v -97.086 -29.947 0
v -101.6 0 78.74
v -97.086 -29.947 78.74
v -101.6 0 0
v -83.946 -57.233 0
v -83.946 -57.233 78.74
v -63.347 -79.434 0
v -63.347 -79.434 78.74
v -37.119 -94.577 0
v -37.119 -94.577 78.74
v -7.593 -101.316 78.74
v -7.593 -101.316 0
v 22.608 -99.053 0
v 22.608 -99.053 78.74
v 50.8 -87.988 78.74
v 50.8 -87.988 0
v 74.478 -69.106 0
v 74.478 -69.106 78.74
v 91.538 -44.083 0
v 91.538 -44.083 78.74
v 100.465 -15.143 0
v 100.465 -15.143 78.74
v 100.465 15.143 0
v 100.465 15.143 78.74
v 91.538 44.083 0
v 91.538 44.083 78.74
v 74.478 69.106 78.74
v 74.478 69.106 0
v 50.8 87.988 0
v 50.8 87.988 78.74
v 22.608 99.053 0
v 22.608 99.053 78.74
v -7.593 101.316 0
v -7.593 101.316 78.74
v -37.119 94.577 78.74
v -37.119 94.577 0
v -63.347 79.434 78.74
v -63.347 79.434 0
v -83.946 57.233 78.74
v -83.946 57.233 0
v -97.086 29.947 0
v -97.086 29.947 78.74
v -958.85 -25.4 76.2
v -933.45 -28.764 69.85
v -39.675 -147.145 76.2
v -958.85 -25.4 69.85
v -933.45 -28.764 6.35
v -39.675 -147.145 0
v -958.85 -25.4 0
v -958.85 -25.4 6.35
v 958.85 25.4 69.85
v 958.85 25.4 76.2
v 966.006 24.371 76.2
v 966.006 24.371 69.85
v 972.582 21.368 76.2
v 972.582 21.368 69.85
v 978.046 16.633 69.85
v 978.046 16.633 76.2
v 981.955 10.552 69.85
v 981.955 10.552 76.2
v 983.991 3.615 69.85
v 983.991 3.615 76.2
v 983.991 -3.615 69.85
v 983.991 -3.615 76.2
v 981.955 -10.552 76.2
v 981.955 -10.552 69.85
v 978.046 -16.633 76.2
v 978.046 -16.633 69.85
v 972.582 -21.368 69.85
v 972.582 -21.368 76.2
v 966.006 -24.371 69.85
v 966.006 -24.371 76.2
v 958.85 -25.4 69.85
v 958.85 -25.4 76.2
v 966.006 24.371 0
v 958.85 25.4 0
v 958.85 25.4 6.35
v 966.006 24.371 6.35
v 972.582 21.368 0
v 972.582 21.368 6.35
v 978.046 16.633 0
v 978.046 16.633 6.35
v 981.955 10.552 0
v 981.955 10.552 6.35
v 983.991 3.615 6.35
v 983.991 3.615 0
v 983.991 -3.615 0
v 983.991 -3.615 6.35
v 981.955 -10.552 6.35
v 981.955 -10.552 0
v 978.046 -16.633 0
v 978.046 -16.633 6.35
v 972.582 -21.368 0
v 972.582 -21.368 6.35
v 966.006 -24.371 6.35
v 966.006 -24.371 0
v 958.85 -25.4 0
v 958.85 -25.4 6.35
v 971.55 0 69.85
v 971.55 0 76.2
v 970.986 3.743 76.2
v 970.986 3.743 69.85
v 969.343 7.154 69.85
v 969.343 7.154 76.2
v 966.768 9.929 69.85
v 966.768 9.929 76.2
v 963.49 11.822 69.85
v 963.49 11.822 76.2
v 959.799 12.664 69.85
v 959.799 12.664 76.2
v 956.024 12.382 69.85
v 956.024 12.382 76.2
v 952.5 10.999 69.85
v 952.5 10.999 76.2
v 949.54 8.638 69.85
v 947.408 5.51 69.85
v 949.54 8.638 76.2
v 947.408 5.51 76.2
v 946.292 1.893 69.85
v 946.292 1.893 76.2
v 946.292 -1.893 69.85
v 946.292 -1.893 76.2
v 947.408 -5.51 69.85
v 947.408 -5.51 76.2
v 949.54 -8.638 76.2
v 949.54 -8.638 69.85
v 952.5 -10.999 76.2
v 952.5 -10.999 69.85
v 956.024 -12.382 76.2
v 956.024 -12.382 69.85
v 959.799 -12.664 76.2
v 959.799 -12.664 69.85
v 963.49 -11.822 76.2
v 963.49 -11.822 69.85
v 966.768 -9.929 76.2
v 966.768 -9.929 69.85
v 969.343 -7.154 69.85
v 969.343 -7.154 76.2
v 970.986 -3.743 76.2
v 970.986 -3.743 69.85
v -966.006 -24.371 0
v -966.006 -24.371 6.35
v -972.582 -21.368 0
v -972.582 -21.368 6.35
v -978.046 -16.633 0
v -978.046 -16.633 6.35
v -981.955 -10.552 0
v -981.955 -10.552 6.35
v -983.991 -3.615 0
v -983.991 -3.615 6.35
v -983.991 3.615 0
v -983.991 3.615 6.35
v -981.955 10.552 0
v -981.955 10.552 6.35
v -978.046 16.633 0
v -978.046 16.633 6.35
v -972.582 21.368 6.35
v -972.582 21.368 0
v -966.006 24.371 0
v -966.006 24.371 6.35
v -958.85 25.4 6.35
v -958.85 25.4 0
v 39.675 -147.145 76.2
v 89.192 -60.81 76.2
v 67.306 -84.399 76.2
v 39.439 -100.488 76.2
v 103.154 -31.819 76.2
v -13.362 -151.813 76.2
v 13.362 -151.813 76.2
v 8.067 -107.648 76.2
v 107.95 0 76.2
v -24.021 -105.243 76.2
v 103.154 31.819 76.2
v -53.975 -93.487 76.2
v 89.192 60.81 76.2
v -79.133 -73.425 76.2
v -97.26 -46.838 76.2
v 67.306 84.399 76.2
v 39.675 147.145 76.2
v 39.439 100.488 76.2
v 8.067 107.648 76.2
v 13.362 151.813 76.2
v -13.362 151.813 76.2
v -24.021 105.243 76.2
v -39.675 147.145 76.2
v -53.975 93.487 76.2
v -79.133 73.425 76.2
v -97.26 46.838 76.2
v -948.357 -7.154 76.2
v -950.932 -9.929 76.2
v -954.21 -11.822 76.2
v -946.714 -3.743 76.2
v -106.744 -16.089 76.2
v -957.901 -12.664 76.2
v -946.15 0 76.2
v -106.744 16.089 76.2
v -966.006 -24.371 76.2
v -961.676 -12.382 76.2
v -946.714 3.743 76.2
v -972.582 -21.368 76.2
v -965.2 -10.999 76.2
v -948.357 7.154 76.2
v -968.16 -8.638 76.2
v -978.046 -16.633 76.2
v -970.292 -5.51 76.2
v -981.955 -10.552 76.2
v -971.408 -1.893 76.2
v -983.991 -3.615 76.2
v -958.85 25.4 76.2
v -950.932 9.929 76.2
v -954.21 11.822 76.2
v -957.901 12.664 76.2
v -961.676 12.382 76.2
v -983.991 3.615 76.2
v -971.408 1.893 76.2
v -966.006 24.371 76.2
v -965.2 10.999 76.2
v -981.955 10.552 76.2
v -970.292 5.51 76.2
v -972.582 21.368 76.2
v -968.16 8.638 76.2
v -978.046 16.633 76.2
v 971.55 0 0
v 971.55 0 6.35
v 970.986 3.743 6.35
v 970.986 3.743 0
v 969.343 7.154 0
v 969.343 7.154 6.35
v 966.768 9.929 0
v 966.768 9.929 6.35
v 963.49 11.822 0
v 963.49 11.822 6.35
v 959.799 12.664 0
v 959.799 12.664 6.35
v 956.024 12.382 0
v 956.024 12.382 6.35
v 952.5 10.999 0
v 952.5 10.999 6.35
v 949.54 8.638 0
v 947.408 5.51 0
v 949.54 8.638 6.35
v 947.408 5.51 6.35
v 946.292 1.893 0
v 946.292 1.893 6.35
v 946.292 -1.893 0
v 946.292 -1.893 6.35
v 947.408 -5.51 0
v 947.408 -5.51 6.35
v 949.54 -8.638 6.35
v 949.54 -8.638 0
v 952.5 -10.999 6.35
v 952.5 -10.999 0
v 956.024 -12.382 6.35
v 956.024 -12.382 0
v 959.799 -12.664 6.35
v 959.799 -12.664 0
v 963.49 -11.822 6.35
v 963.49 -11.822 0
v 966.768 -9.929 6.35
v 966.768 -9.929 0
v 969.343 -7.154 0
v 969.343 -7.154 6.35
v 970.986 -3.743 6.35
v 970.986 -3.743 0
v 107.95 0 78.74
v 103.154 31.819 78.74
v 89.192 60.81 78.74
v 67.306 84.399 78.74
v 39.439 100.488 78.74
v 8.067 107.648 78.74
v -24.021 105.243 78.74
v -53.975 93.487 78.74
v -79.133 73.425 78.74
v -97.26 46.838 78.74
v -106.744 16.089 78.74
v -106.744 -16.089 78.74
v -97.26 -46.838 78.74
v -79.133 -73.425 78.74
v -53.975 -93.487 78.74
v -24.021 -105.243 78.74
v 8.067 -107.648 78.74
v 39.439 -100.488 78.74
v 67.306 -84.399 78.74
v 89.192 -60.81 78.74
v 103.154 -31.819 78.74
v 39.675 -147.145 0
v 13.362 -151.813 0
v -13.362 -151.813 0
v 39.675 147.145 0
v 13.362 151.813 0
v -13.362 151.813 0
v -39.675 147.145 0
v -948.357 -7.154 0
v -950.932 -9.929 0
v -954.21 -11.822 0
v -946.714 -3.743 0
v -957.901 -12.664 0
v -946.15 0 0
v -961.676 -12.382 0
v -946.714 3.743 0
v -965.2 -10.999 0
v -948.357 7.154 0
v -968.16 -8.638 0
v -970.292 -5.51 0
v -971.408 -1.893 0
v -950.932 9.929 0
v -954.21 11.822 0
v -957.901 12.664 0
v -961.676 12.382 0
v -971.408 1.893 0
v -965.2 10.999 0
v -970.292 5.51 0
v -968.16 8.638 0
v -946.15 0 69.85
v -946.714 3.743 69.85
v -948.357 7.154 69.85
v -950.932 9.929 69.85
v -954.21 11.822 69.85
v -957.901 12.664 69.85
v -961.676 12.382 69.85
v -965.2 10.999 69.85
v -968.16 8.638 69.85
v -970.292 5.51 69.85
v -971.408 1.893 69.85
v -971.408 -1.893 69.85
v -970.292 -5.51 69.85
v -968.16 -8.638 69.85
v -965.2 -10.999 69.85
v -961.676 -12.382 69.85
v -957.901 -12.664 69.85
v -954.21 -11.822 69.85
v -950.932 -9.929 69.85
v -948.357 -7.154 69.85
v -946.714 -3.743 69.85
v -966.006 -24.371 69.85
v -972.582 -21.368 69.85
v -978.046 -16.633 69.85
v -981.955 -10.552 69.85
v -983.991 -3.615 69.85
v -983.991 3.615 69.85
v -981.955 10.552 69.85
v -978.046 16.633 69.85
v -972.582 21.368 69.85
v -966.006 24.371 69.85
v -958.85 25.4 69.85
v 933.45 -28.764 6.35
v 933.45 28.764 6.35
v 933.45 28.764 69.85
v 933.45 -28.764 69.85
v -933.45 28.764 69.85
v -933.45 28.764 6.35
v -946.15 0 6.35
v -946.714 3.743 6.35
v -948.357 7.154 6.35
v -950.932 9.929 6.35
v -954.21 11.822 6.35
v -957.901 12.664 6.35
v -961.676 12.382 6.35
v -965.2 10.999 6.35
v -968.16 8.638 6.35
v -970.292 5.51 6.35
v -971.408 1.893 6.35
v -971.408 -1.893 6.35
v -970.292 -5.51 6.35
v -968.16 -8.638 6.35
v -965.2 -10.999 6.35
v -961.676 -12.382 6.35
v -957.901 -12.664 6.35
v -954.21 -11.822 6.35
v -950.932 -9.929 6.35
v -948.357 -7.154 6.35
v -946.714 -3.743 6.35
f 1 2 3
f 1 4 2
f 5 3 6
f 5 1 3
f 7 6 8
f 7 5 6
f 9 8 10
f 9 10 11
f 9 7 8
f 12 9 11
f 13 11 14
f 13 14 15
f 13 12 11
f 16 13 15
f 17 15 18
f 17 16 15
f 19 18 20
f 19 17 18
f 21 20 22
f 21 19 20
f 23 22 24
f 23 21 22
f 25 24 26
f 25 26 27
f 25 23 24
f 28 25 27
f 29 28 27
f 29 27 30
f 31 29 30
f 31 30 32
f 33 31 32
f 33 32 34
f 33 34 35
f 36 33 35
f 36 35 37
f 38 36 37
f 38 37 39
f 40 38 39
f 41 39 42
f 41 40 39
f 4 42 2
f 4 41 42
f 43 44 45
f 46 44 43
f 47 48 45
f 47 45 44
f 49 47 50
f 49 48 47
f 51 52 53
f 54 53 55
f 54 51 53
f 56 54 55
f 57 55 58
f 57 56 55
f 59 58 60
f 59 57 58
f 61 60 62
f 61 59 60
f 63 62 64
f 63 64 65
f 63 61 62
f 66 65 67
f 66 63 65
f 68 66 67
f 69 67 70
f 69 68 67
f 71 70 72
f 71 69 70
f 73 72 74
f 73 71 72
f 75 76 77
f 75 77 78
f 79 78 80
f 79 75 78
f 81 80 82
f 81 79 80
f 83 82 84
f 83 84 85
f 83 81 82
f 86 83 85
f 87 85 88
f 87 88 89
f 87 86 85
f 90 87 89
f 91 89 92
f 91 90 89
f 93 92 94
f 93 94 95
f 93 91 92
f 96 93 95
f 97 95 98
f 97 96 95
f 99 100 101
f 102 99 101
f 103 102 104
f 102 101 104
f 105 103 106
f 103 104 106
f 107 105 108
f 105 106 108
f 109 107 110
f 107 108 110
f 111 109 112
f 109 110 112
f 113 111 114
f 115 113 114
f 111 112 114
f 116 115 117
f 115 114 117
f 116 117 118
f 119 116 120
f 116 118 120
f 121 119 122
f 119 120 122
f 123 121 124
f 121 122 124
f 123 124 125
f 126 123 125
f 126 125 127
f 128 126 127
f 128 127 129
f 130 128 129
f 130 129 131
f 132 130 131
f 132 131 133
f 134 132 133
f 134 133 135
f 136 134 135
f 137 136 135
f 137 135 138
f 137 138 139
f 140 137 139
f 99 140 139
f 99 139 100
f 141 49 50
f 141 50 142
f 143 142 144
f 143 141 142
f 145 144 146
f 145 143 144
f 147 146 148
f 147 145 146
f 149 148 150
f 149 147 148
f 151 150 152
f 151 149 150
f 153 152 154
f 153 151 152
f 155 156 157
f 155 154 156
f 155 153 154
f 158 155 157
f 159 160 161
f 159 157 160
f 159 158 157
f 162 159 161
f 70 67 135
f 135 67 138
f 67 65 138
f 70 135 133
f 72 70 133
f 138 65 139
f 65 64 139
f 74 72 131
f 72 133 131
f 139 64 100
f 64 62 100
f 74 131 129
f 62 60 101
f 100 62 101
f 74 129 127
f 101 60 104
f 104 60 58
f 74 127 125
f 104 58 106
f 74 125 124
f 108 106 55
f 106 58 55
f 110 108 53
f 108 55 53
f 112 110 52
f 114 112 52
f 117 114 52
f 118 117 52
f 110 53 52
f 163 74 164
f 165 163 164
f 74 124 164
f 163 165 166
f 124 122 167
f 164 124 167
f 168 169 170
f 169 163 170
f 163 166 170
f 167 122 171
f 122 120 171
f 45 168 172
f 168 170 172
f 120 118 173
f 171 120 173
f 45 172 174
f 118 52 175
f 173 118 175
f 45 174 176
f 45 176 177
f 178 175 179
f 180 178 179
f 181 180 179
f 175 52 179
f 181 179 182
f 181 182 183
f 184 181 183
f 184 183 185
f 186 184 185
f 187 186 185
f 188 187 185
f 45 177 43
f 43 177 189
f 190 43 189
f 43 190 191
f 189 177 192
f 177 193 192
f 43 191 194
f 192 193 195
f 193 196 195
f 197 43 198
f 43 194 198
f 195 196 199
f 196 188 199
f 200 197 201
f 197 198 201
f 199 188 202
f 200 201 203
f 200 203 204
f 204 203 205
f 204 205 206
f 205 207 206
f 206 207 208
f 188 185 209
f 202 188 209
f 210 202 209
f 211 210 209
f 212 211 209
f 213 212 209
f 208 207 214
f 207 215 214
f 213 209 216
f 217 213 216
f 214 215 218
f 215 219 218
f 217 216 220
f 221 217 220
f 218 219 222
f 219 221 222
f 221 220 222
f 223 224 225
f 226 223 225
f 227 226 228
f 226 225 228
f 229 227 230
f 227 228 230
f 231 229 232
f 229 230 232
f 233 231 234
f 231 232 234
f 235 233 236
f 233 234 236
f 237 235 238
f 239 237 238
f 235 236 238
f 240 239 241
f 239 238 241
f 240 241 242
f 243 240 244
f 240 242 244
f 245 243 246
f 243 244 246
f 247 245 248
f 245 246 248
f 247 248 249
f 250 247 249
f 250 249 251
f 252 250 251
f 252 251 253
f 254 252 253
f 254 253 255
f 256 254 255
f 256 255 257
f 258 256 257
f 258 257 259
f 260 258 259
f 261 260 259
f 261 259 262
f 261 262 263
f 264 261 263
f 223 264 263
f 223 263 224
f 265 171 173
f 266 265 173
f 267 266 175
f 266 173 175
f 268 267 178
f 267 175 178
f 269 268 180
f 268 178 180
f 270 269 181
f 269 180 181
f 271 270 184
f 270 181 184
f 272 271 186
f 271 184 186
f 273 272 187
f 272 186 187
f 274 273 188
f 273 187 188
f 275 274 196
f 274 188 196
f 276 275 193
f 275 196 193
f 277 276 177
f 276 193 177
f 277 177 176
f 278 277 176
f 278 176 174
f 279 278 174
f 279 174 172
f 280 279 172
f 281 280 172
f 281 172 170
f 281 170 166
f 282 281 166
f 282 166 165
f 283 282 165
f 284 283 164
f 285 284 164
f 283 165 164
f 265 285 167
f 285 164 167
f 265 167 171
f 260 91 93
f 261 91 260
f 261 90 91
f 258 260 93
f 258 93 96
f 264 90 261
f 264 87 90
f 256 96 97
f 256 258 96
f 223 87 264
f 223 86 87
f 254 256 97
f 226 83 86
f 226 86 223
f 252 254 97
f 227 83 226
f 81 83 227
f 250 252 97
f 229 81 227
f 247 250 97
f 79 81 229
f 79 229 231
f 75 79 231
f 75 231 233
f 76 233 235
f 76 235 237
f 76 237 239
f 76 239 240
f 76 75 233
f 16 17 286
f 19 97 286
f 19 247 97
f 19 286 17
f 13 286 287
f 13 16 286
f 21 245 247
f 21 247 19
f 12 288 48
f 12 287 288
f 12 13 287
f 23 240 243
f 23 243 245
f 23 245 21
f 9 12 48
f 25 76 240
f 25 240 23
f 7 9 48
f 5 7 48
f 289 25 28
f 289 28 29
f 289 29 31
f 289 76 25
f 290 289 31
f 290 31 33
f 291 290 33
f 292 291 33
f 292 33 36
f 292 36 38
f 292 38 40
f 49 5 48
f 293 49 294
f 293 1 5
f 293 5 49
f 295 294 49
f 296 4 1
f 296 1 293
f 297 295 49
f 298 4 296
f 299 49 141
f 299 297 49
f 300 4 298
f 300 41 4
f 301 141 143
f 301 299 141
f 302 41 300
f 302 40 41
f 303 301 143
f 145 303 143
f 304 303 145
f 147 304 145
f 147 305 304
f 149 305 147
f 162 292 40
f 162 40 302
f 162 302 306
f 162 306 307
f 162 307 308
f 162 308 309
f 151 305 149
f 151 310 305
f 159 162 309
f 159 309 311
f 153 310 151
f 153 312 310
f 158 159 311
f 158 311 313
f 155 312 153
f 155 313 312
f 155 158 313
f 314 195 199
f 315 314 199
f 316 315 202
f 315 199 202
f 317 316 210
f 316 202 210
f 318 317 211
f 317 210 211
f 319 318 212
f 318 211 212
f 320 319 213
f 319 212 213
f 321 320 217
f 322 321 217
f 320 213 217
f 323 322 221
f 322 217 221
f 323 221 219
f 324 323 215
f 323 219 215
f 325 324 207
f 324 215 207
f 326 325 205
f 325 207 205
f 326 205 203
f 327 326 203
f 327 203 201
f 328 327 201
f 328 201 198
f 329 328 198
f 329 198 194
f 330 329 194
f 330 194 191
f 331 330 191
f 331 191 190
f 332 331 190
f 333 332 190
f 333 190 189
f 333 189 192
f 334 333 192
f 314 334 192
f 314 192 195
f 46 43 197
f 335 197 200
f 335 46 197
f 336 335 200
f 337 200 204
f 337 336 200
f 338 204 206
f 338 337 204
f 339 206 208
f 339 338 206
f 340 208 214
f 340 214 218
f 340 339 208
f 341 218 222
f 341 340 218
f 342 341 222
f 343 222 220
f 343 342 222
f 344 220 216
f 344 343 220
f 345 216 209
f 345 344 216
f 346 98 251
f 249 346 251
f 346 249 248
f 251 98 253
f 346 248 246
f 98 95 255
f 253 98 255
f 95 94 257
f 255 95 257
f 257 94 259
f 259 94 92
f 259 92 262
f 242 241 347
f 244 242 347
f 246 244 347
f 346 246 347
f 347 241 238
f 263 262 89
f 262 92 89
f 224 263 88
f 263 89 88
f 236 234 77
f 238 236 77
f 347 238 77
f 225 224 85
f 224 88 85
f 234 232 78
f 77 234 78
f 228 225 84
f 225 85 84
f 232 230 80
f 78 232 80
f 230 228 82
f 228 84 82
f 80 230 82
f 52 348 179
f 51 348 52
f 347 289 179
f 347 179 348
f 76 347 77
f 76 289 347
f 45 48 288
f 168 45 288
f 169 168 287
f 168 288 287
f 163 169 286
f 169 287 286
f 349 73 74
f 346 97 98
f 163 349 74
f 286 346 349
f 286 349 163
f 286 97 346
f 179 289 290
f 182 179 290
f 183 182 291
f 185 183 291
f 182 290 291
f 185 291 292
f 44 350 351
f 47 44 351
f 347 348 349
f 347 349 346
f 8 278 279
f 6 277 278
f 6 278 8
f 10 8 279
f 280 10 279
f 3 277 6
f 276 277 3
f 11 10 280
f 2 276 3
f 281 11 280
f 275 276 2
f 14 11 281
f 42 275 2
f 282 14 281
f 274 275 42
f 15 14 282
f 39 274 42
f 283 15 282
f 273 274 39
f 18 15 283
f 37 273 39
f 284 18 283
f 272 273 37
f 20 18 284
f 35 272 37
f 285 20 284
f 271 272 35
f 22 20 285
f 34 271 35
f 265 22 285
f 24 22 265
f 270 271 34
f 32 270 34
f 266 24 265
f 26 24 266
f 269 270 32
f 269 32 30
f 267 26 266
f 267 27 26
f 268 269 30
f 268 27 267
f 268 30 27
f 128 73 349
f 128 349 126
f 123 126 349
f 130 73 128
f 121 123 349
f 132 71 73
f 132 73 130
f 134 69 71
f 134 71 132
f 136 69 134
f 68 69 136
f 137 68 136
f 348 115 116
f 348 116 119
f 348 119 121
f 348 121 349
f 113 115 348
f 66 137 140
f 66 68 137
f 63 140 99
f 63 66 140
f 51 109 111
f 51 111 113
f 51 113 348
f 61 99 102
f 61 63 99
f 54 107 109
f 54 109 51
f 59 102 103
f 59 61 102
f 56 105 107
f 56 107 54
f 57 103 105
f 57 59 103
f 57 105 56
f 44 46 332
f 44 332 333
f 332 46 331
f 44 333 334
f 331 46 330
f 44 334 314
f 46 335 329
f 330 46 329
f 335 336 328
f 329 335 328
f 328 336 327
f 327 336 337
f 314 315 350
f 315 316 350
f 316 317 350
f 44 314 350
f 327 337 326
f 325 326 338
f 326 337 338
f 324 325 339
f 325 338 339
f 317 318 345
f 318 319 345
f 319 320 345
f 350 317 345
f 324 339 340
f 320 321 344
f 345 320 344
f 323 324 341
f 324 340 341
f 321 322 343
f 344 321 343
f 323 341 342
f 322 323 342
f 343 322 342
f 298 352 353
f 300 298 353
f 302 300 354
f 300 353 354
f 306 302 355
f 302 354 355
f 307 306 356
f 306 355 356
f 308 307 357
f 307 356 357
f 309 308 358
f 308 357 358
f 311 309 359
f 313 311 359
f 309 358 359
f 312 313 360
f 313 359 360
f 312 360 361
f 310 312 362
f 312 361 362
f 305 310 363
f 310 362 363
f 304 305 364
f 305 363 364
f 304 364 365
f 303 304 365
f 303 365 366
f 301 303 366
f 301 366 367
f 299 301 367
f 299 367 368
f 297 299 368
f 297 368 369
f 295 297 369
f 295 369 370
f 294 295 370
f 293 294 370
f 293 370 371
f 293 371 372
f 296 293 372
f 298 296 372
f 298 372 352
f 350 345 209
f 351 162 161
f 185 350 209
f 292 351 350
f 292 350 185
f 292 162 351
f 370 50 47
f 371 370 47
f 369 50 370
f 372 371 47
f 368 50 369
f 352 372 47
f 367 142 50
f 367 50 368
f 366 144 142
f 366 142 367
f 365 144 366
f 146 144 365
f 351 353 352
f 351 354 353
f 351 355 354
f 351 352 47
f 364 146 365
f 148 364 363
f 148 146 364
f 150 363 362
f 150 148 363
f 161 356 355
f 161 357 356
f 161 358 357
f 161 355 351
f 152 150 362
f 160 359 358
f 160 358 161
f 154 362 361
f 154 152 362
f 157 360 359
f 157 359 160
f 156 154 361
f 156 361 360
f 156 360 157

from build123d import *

# Parameters (mm, degrees)
SKETCH1_R           = 152.4
SKETCH1_R_2         = 101.6
BOSS_EXTRUDE1_DEPTH = 76.2
BOSS_EXTRUDE3_START = -76.2
BOSS_EXTRUDE3_DEPTH = 76.2
SKETCH7_R           = 12.7
CUT_EXTRUDE2_DEPTH  = 999.889514661
SKETCH8_W           = 63.5
SKETCH8_H           = 127
CUT_EXTRUDE3_DEPTH  = 50.8
SKETCH9_W           = 63.5
SKETCH9_H           = 127
CUT_EXTRUDE5_DEPTH  = 50.8
SKETCH11_R          = 107.95
SKETCH11_R_2        = 101.6
BOSS_EXTRUDE4_DEPTH = 2.54


with BuildPart() as part:
    # Sketch1 → Boss-Extrude1 (new body)
    with BuildSketch(Plane.XY):
        with Locations(Location((0, 0, 0), (0, 0, 180))):
            Circle(SKETCH1_R)
        with Locations(Location((0, 0, 0), (0, 0, 180))):
            Circle(SKETCH1_R_2, mode=Mode.SUBTRACT)
    extrude(amount=BOSS_EXTRUDE1_DEPTH)

    # Sketch2 → Boss-Extrude3 (add)
    with BuildSketch(Plane.XY.offset(76.2).offset(BOSS_EXTRUDE3_START)):
        with BuildLine():
            Line((-958.85, 25.4), (-39.674841602, 147.145054092))
            ThreePointArc((-39.674841602, 147.145054092), (-152.4, 0), (-39.674841602, -147.145054092))
            Line((-39.674841602, -147.145054092), (-958.85, -25.4))
            ThreePointArc((-958.85, -25.4), (-984.25, 0), (-958.85, 25.4))
        make_face()
        with BuildLine():
            Line((39.674841602, 147.145054092), (958.85, 25.4))
            ThreePointArc((958.85, 25.4), (984.25, 0), (958.85, -25.4))
            Line((958.85, -25.4), (39.674841602, -147.145054092))
            ThreePointArc((39.674841602, -147.145054092), (152.4, 0), (39.674841602, 147.145054092))
        make_face()
    extrude(amount=BOSS_EXTRUDE3_DEPTH)

    # Sketch7 → Cut-Extrude2 (cut, through all)
    with BuildSketch(Plane.XY.offset(76.2)):
        with Locations((-958.85, 0)):
            Circle(SKETCH7_R)
        with Locations((958.85, 0)):
            Circle(SKETCH7_R)
    extrude(amount=-CUT_EXTRUDE2_DEPTH, mode=Mode.SUBTRACT)

    # Sketch8 → Cut-Extrude3 (cut)
    with BuildSketch(Plane(origin=(984.25, 0, 0), x_dir=(0, 0, -1), z_dir=(1, 0, 0))):
        with Locations((-38.1, 0)):
            Rectangle(SKETCH8_W, SKETCH8_H)
    extrude(amount=-CUT_EXTRUDE3_DEPTH, mode=Mode.SUBTRACT)

    # Sketch9 → Cut-Extrude5 (cut)
    with BuildSketch(Plane(origin=(-984.25, 0, 0), x_dir=(0, 0, -1), z_dir=(1, 0, 0))):
        with Locations((-38.1, 0)):
            Rectangle(SKETCH9_W, SKETCH9_H)
    extrude(amount=CUT_EXTRUDE5_DEPTH, mode=Mode.SUBTRACT)

    # Sketch11 → Boss-Extrude4 (add)
    with BuildSketch(Plane.XY.offset(76.2)):
        Circle(SKETCH11_R)
        with Locations(Location((0, 0, 0), (0, 0, 180))):
            Circle(SKETCH11_R_2, mode=Mode.SUBTRACT)
    extrude(amount=BOSS_EXTRUDE4_DEPTH)


solid = part.part
